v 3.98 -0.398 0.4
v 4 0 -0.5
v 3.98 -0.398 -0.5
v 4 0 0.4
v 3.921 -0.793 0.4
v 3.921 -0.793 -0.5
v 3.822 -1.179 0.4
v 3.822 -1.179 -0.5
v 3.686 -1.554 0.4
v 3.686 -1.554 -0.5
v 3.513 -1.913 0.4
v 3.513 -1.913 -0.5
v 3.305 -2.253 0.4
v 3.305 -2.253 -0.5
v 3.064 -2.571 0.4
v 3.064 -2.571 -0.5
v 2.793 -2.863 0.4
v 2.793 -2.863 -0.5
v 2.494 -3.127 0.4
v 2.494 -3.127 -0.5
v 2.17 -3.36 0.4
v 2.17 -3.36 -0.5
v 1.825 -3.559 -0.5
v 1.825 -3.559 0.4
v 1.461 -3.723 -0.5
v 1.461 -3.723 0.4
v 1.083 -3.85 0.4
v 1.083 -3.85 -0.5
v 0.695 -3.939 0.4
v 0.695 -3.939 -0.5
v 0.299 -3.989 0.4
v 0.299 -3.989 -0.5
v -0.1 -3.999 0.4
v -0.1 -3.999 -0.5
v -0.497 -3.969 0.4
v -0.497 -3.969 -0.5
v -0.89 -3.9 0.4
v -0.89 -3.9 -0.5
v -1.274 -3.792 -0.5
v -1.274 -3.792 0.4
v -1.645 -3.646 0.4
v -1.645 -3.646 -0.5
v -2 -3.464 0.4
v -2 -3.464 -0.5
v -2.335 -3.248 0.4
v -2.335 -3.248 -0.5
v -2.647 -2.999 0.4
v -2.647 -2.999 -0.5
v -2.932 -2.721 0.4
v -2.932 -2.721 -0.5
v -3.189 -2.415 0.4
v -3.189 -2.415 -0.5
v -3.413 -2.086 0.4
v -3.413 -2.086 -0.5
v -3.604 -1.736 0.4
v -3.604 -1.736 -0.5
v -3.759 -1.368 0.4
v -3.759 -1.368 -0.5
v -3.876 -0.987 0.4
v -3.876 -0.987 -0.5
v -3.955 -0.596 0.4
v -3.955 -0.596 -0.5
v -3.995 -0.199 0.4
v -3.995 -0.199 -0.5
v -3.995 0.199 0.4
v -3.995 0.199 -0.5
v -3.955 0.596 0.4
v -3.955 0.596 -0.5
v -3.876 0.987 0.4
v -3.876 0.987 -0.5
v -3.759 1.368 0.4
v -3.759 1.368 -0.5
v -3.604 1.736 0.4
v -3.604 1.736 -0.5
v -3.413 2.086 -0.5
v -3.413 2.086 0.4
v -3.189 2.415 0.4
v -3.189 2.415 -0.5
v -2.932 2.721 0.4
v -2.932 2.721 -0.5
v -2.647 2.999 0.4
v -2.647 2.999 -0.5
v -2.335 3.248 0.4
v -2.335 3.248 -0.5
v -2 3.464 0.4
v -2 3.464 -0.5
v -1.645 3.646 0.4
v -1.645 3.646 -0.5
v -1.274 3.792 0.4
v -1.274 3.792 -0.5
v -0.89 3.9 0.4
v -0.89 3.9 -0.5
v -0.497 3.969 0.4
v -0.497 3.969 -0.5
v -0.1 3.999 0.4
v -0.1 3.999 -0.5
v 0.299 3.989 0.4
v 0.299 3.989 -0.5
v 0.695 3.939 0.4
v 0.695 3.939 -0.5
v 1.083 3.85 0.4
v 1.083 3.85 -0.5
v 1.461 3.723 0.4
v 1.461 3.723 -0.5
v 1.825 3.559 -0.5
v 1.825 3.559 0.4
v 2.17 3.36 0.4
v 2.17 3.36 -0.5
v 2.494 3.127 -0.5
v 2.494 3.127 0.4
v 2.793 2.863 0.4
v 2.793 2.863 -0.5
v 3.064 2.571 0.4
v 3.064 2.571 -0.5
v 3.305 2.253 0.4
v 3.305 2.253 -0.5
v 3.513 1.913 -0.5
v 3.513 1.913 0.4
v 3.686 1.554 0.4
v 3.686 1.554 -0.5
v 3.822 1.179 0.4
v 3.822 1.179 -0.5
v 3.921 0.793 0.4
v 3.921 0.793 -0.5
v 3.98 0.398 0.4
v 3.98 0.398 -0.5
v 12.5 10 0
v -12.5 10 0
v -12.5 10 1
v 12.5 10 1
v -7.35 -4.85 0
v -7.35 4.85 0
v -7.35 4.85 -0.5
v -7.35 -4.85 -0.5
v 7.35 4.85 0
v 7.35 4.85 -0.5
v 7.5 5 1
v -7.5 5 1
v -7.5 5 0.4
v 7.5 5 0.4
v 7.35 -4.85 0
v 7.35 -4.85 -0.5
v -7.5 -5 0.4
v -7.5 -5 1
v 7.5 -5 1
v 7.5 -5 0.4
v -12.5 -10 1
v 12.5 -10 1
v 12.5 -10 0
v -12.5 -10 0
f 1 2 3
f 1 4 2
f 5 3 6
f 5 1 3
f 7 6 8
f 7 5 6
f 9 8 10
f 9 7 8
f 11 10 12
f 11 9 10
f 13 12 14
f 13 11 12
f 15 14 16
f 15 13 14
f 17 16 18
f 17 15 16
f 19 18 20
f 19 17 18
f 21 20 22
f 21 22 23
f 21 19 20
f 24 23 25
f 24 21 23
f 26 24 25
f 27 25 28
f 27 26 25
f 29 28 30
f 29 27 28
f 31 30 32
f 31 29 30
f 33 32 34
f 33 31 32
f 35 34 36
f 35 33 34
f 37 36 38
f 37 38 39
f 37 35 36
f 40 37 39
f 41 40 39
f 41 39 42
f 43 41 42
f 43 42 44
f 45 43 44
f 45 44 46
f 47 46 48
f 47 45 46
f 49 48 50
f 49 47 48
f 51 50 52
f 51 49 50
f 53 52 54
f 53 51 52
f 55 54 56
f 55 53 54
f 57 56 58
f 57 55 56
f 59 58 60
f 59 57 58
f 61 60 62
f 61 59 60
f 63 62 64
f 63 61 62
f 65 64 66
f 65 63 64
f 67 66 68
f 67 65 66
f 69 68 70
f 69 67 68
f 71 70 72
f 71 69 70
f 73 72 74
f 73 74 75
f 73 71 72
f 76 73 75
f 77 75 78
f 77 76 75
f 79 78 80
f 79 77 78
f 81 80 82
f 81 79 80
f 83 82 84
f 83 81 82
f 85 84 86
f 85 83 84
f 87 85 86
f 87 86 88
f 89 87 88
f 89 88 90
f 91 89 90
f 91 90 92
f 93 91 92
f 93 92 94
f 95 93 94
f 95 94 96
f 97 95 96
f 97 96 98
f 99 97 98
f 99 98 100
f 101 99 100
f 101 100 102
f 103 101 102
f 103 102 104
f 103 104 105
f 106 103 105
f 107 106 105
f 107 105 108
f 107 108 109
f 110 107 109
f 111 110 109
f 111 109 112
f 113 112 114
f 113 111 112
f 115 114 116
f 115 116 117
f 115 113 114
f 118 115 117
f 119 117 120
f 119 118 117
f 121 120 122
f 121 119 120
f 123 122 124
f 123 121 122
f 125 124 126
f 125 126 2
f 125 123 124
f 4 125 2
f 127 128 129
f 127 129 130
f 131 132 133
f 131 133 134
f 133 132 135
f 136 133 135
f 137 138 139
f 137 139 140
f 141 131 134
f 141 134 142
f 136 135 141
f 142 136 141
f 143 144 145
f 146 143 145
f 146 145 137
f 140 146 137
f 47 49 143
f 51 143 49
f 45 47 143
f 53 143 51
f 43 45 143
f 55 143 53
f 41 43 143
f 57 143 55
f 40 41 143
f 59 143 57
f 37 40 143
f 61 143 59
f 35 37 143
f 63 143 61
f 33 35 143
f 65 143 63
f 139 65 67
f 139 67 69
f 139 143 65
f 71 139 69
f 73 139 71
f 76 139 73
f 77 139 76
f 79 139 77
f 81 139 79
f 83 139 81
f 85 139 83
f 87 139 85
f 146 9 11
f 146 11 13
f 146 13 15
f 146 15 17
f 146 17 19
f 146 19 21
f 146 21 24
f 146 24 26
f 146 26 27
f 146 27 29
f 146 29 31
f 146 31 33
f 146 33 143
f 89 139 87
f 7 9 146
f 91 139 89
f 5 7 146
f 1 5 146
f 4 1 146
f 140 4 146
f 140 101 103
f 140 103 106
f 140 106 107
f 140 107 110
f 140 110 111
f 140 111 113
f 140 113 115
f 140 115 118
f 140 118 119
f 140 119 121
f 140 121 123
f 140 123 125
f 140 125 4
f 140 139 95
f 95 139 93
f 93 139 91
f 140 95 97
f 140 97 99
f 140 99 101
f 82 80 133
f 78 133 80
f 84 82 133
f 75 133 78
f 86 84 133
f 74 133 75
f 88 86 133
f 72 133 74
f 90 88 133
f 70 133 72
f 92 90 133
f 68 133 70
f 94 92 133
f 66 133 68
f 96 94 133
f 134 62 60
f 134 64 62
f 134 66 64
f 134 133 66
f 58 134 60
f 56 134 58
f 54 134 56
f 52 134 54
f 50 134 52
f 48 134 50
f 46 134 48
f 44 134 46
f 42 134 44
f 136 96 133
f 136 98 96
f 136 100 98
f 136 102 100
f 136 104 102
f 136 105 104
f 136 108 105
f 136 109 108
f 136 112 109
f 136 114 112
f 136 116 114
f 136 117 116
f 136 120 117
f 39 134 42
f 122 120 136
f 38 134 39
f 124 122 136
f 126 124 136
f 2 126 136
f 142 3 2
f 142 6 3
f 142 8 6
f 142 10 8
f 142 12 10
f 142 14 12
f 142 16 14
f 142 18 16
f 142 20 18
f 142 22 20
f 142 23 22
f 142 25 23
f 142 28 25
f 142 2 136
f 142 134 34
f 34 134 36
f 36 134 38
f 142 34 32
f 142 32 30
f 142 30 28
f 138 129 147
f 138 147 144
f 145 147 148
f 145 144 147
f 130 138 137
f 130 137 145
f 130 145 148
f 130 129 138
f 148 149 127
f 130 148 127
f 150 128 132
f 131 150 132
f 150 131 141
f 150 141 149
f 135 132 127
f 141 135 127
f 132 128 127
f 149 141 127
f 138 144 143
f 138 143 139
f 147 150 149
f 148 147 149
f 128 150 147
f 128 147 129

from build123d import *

# Parameters (mm, degrees)
F0_W     = 25
F0_H     = 20
F0_R     = 4
F1_DEPTH = 1
F2_W     = 15
F2_H     = 10
F3_DEPTH = 0.6
F4_W     = 14.7
F4_H     = 9.7
F4_R     = 4
F5_DEPTH = 0.5


with BuildPart() as f1:
    # F0 (on Top) → F1 (new body)
    with BuildSketch(Plane.XY):
        Rectangle(F0_W, F0_H)
        Circle(F0_R, mode=Mode.SUBTRACT)
    extrude(amount=F1_DEPTH)

    # F2 (on face) → F3 (cut)
    with BuildSketch(Plane.XY.offset(1)):
        Rectangle(F2_W, F2_H)
    extrude(amount=-F3_DEPTH, mode=Mode.SUBTRACT)

    # F4 (on face) → F5 (join)
    with BuildSketch(Plane(origin=(0, 0, 0), x_dir=(1, 0, 0), z_dir=(0, 0, -1))):
        Rectangle(F4_W, F4_H)
        Circle(F4_R, mode=Mode.SUBTRACT)
    extrude(amount=F5_DEPTH)


solid = f1.part
